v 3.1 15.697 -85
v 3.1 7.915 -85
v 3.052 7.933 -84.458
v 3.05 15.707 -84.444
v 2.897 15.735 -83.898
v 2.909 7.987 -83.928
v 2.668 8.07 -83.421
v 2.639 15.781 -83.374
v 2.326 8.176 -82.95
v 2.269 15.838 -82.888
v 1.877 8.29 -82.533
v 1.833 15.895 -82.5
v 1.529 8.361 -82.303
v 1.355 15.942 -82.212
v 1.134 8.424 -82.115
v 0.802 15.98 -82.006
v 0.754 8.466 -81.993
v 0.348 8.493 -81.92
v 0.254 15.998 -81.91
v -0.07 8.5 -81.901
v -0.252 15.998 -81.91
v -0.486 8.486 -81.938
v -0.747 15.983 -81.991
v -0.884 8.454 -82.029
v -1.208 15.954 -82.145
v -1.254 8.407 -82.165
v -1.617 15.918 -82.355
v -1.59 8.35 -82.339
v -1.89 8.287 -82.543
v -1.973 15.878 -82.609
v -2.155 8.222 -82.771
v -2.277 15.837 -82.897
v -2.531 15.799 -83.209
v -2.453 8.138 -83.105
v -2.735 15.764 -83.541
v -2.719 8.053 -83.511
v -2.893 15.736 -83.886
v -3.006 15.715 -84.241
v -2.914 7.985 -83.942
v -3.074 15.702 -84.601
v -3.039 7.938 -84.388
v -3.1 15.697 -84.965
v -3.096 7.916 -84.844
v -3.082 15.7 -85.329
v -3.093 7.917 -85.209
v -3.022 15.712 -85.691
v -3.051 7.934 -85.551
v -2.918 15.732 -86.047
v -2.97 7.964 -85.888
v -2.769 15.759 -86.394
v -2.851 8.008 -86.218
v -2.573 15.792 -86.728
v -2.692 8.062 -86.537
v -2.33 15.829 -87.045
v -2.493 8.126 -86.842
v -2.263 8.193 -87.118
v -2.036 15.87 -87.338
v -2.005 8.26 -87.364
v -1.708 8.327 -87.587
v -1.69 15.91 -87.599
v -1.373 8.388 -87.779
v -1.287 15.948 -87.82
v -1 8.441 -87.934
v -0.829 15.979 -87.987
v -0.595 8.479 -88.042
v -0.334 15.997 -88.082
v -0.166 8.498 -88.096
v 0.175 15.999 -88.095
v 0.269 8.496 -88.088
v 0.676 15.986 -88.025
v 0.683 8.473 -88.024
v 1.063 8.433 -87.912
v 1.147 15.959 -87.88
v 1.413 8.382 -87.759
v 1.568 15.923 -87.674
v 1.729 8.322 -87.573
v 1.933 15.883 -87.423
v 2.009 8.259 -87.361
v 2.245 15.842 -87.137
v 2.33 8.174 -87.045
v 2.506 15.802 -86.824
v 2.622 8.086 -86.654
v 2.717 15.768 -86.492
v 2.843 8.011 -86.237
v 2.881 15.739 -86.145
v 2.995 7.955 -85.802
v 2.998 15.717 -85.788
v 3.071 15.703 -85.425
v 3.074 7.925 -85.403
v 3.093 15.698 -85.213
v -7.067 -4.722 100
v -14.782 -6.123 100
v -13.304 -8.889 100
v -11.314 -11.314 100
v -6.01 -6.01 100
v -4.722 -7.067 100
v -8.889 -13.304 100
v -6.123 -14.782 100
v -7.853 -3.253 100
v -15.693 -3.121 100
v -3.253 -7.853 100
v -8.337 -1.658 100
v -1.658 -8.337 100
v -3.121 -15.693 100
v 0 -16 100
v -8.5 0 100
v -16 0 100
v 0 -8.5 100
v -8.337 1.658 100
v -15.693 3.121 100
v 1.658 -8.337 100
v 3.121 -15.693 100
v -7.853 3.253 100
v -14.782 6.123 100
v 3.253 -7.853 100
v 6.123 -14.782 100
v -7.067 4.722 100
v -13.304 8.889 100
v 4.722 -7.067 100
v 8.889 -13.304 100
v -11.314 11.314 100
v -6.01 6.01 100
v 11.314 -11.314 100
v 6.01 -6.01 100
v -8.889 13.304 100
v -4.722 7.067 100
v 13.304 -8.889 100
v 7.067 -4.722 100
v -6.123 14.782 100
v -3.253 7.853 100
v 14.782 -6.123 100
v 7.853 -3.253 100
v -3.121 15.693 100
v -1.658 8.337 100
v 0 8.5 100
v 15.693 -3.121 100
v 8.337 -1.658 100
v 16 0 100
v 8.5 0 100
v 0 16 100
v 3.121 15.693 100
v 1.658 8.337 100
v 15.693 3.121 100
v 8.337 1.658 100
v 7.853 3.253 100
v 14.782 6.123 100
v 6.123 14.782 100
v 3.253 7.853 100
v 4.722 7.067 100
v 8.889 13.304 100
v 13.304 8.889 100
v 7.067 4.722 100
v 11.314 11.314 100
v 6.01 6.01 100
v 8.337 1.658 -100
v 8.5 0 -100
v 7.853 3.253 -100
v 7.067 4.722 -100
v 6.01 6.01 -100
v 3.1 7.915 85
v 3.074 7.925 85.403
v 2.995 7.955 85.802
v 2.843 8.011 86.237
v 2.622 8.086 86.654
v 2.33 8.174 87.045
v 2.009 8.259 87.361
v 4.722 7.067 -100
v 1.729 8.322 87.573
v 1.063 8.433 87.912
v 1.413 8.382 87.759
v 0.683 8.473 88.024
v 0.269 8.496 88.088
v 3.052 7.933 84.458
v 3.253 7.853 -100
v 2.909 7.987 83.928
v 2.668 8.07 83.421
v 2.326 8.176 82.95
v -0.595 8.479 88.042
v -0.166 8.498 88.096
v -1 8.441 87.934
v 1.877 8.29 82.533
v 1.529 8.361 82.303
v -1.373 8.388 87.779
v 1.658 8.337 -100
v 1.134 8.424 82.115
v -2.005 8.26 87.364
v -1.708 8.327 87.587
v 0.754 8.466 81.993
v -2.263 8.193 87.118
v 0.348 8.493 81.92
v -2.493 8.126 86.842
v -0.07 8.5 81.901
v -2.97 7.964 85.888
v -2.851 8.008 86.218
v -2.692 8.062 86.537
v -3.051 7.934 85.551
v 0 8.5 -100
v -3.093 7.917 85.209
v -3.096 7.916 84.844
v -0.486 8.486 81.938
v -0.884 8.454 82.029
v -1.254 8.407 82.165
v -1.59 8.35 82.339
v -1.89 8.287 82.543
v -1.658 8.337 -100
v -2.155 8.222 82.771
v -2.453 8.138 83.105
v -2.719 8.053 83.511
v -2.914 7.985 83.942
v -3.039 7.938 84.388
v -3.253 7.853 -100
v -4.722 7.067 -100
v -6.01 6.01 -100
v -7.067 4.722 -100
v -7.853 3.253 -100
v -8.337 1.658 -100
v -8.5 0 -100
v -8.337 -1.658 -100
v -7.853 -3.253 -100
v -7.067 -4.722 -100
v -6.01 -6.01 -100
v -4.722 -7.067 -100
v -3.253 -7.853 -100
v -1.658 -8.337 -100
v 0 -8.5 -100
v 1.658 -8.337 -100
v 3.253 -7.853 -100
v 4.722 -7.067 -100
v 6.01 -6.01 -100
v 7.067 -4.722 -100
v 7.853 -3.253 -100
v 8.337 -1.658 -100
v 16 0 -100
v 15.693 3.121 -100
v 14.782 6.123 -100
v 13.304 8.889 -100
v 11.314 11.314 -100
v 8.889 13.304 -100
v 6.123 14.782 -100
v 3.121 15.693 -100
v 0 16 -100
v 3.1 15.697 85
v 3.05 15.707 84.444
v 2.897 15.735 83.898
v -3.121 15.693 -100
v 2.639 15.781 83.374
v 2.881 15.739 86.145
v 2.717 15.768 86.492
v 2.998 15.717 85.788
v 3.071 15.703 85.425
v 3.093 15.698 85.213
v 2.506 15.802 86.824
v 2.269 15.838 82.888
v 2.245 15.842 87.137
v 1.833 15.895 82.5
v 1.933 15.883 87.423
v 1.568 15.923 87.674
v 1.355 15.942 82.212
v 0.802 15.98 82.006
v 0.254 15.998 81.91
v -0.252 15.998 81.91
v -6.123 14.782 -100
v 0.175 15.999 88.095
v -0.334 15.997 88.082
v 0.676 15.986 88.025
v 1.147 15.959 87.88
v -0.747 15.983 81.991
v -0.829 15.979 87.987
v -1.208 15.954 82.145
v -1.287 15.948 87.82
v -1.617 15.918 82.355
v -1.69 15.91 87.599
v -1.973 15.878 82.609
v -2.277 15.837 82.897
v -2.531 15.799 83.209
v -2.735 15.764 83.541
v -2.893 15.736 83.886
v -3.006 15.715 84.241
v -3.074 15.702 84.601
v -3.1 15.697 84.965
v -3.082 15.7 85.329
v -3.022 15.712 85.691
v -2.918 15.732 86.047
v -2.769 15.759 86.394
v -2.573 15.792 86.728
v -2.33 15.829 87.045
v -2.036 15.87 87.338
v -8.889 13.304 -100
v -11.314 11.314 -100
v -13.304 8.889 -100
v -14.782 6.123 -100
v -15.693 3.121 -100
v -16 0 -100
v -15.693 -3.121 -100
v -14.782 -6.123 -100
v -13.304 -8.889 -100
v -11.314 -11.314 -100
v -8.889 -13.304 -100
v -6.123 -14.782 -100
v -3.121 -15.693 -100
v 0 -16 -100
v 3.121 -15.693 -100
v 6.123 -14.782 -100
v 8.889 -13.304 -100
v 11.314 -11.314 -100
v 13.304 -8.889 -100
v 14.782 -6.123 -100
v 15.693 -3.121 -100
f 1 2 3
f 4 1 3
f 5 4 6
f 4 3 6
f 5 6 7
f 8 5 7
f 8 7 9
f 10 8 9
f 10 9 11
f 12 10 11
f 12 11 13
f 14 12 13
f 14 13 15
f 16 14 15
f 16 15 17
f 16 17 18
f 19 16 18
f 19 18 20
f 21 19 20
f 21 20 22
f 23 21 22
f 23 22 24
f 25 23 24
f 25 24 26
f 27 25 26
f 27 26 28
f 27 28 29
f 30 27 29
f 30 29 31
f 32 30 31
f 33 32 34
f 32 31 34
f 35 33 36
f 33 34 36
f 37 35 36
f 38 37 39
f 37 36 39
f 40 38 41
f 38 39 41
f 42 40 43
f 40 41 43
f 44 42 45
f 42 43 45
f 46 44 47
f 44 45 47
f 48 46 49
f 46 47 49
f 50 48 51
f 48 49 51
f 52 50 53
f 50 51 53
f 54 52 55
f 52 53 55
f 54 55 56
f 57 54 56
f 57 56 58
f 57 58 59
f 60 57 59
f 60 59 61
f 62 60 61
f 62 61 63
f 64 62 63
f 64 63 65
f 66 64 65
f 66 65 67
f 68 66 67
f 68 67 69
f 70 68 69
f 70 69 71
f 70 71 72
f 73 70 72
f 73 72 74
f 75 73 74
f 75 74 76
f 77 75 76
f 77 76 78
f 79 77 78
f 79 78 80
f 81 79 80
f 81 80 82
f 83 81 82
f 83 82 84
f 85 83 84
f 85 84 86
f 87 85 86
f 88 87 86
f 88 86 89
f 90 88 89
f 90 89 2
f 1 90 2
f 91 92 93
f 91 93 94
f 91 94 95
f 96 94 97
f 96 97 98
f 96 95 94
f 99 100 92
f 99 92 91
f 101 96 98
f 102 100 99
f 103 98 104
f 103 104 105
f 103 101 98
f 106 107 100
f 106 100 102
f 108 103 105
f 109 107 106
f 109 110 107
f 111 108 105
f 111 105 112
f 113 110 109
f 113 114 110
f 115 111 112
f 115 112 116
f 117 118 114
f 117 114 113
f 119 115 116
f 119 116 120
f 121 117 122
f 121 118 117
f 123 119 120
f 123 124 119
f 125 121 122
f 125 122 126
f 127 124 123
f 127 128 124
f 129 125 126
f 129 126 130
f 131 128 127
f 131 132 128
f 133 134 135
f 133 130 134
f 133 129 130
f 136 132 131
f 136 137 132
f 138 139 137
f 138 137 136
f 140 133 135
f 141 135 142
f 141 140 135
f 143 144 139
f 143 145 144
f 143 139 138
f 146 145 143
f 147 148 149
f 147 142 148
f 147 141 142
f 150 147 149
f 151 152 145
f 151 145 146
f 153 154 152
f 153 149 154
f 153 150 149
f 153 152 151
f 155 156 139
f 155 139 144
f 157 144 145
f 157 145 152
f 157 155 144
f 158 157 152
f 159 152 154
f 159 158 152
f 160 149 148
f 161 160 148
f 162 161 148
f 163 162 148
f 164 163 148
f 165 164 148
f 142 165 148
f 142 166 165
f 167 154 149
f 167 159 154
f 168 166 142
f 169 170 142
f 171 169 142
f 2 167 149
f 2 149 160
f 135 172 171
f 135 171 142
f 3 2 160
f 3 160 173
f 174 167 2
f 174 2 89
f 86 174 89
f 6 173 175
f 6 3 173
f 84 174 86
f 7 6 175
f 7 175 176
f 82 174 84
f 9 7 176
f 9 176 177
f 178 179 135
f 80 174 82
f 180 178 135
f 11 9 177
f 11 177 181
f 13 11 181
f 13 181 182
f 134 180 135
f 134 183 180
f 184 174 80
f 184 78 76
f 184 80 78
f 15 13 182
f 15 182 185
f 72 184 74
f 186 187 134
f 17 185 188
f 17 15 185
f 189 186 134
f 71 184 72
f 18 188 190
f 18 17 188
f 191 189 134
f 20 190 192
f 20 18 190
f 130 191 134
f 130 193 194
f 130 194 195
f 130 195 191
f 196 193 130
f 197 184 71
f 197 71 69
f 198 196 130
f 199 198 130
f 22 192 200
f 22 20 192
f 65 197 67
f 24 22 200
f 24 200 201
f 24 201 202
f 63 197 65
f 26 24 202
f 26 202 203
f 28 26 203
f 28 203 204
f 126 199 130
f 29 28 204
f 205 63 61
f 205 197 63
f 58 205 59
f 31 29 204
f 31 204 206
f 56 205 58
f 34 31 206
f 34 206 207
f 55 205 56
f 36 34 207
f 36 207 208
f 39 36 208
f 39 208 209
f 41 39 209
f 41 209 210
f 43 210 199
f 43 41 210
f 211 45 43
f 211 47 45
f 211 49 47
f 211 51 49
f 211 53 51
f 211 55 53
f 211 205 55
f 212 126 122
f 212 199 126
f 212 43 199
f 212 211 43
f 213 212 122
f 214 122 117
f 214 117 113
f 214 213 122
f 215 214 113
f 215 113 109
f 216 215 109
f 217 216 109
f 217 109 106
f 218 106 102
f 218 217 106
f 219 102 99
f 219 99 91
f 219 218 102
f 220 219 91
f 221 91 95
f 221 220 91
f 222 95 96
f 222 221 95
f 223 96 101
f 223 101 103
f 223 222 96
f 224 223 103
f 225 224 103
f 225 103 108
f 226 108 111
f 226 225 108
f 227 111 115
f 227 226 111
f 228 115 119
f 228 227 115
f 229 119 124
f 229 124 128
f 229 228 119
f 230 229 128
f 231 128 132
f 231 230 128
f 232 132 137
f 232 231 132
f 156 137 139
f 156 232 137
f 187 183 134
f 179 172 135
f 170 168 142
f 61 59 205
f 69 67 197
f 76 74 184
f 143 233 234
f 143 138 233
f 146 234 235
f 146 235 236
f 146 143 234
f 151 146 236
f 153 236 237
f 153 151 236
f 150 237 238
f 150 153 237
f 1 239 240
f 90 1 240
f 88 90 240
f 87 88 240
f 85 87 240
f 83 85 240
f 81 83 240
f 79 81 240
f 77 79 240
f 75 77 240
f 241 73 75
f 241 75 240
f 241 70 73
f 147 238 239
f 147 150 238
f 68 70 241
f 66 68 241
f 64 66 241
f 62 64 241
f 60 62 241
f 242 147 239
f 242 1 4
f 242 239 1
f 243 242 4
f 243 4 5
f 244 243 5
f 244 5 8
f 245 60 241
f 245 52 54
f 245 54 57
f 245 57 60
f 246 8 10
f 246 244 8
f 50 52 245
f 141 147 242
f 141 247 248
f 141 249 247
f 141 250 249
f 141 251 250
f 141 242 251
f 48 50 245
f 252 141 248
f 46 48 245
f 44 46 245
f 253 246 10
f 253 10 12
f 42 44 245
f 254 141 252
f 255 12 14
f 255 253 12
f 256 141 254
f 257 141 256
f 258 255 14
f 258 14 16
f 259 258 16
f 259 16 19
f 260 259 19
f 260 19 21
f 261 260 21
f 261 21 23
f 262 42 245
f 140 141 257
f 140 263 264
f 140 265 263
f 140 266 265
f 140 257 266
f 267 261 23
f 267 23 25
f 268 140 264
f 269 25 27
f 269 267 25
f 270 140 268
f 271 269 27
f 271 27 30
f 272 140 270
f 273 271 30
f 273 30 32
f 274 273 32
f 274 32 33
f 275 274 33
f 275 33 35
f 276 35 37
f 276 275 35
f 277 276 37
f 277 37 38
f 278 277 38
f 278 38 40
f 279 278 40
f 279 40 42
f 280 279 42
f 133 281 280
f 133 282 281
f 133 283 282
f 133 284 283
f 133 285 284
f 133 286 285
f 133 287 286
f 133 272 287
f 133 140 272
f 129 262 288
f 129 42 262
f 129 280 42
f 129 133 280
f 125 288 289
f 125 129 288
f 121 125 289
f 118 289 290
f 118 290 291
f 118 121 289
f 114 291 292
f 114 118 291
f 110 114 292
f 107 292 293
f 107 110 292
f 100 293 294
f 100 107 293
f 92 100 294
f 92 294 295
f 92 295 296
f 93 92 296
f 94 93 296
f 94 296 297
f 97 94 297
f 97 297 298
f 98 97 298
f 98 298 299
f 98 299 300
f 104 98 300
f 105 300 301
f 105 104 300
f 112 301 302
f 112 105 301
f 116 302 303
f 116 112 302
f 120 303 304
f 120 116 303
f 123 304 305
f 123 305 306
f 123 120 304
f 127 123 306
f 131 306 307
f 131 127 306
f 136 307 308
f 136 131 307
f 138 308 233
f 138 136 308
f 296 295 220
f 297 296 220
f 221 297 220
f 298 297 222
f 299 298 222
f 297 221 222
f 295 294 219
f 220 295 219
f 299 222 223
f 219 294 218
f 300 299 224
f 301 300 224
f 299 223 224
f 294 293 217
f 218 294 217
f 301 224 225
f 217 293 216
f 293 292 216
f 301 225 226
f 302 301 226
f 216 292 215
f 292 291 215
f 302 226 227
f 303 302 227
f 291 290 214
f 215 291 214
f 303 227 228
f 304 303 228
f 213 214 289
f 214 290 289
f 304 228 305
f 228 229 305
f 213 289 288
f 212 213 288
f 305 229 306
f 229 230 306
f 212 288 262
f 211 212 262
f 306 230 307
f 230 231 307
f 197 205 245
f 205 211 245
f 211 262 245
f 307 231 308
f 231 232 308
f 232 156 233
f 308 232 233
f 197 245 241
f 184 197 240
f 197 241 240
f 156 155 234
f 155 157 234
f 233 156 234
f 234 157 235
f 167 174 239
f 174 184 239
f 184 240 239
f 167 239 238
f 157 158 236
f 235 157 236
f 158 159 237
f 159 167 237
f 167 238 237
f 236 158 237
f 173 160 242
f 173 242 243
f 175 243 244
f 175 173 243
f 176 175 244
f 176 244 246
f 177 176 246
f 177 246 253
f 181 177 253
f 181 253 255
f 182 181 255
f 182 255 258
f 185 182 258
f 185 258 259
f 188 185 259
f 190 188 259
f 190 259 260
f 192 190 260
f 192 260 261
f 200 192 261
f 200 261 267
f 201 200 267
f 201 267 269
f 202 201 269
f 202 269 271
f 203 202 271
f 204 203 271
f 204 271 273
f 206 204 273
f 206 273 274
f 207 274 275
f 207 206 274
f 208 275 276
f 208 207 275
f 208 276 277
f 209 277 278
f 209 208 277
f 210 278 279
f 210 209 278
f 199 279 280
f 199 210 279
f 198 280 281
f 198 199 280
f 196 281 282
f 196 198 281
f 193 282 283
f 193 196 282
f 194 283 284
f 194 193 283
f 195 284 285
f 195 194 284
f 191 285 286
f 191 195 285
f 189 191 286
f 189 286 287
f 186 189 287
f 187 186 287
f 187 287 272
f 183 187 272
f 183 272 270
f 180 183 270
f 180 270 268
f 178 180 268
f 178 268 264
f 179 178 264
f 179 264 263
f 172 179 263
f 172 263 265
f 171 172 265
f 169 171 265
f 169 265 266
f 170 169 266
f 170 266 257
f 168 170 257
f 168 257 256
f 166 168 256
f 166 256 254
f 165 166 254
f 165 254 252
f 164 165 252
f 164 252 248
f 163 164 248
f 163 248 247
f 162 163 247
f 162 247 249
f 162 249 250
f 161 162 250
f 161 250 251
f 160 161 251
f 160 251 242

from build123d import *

# Parameters (mm, degrees)
BOSS_EXTRUDE1_DEPTH      = 100
BOSS_EXTRUDE1_DEPTH_BACK = 100
SKETCH2_R                = 16
SKETCH2_R_2              = 8.5
SKETCH4_R                = 3.1
CUT_EXTRUDE1_DEPTH       = 103.528044944


with BuildPart() as part:
    # Sketch2 → Boss-Extrude1 (new, two sides: drawn at the far end of the back side and taken through both)
    with BuildSketch(Plane.XY.offset(-BOSS_EXTRUDE1_DEPTH_BACK)):
        Circle(SKETCH2_R)
        Circle(SKETCH2_R_2, mode=Mode.SUBTRACT)
    extrude(amount=BOSS_EXTRUDE1_DEPTH + BOSS_EXTRUDE1_DEPTH_BACK)

    # Sketch4 → Cut-Extrude1 (cut, through all)
    with BuildSketch(Plane(origin=(0, 0, 0), x_dir=(1, 0, 0), z_dir=(0, 1, 0))):
        with Locations((0, -85)):
            Circle(SKETCH4_R)
    cut_extrude1 = extrude(amount=CUT_EXTRUDE1_DEPTH, mode=Mode.SUBTRACT)

    # Mirror1: Cut-Extrude1 across plane
    add(cut_extrude1.mirror(Plane.XY), mode=Mode.SUBTRACT)


solid = part.part
